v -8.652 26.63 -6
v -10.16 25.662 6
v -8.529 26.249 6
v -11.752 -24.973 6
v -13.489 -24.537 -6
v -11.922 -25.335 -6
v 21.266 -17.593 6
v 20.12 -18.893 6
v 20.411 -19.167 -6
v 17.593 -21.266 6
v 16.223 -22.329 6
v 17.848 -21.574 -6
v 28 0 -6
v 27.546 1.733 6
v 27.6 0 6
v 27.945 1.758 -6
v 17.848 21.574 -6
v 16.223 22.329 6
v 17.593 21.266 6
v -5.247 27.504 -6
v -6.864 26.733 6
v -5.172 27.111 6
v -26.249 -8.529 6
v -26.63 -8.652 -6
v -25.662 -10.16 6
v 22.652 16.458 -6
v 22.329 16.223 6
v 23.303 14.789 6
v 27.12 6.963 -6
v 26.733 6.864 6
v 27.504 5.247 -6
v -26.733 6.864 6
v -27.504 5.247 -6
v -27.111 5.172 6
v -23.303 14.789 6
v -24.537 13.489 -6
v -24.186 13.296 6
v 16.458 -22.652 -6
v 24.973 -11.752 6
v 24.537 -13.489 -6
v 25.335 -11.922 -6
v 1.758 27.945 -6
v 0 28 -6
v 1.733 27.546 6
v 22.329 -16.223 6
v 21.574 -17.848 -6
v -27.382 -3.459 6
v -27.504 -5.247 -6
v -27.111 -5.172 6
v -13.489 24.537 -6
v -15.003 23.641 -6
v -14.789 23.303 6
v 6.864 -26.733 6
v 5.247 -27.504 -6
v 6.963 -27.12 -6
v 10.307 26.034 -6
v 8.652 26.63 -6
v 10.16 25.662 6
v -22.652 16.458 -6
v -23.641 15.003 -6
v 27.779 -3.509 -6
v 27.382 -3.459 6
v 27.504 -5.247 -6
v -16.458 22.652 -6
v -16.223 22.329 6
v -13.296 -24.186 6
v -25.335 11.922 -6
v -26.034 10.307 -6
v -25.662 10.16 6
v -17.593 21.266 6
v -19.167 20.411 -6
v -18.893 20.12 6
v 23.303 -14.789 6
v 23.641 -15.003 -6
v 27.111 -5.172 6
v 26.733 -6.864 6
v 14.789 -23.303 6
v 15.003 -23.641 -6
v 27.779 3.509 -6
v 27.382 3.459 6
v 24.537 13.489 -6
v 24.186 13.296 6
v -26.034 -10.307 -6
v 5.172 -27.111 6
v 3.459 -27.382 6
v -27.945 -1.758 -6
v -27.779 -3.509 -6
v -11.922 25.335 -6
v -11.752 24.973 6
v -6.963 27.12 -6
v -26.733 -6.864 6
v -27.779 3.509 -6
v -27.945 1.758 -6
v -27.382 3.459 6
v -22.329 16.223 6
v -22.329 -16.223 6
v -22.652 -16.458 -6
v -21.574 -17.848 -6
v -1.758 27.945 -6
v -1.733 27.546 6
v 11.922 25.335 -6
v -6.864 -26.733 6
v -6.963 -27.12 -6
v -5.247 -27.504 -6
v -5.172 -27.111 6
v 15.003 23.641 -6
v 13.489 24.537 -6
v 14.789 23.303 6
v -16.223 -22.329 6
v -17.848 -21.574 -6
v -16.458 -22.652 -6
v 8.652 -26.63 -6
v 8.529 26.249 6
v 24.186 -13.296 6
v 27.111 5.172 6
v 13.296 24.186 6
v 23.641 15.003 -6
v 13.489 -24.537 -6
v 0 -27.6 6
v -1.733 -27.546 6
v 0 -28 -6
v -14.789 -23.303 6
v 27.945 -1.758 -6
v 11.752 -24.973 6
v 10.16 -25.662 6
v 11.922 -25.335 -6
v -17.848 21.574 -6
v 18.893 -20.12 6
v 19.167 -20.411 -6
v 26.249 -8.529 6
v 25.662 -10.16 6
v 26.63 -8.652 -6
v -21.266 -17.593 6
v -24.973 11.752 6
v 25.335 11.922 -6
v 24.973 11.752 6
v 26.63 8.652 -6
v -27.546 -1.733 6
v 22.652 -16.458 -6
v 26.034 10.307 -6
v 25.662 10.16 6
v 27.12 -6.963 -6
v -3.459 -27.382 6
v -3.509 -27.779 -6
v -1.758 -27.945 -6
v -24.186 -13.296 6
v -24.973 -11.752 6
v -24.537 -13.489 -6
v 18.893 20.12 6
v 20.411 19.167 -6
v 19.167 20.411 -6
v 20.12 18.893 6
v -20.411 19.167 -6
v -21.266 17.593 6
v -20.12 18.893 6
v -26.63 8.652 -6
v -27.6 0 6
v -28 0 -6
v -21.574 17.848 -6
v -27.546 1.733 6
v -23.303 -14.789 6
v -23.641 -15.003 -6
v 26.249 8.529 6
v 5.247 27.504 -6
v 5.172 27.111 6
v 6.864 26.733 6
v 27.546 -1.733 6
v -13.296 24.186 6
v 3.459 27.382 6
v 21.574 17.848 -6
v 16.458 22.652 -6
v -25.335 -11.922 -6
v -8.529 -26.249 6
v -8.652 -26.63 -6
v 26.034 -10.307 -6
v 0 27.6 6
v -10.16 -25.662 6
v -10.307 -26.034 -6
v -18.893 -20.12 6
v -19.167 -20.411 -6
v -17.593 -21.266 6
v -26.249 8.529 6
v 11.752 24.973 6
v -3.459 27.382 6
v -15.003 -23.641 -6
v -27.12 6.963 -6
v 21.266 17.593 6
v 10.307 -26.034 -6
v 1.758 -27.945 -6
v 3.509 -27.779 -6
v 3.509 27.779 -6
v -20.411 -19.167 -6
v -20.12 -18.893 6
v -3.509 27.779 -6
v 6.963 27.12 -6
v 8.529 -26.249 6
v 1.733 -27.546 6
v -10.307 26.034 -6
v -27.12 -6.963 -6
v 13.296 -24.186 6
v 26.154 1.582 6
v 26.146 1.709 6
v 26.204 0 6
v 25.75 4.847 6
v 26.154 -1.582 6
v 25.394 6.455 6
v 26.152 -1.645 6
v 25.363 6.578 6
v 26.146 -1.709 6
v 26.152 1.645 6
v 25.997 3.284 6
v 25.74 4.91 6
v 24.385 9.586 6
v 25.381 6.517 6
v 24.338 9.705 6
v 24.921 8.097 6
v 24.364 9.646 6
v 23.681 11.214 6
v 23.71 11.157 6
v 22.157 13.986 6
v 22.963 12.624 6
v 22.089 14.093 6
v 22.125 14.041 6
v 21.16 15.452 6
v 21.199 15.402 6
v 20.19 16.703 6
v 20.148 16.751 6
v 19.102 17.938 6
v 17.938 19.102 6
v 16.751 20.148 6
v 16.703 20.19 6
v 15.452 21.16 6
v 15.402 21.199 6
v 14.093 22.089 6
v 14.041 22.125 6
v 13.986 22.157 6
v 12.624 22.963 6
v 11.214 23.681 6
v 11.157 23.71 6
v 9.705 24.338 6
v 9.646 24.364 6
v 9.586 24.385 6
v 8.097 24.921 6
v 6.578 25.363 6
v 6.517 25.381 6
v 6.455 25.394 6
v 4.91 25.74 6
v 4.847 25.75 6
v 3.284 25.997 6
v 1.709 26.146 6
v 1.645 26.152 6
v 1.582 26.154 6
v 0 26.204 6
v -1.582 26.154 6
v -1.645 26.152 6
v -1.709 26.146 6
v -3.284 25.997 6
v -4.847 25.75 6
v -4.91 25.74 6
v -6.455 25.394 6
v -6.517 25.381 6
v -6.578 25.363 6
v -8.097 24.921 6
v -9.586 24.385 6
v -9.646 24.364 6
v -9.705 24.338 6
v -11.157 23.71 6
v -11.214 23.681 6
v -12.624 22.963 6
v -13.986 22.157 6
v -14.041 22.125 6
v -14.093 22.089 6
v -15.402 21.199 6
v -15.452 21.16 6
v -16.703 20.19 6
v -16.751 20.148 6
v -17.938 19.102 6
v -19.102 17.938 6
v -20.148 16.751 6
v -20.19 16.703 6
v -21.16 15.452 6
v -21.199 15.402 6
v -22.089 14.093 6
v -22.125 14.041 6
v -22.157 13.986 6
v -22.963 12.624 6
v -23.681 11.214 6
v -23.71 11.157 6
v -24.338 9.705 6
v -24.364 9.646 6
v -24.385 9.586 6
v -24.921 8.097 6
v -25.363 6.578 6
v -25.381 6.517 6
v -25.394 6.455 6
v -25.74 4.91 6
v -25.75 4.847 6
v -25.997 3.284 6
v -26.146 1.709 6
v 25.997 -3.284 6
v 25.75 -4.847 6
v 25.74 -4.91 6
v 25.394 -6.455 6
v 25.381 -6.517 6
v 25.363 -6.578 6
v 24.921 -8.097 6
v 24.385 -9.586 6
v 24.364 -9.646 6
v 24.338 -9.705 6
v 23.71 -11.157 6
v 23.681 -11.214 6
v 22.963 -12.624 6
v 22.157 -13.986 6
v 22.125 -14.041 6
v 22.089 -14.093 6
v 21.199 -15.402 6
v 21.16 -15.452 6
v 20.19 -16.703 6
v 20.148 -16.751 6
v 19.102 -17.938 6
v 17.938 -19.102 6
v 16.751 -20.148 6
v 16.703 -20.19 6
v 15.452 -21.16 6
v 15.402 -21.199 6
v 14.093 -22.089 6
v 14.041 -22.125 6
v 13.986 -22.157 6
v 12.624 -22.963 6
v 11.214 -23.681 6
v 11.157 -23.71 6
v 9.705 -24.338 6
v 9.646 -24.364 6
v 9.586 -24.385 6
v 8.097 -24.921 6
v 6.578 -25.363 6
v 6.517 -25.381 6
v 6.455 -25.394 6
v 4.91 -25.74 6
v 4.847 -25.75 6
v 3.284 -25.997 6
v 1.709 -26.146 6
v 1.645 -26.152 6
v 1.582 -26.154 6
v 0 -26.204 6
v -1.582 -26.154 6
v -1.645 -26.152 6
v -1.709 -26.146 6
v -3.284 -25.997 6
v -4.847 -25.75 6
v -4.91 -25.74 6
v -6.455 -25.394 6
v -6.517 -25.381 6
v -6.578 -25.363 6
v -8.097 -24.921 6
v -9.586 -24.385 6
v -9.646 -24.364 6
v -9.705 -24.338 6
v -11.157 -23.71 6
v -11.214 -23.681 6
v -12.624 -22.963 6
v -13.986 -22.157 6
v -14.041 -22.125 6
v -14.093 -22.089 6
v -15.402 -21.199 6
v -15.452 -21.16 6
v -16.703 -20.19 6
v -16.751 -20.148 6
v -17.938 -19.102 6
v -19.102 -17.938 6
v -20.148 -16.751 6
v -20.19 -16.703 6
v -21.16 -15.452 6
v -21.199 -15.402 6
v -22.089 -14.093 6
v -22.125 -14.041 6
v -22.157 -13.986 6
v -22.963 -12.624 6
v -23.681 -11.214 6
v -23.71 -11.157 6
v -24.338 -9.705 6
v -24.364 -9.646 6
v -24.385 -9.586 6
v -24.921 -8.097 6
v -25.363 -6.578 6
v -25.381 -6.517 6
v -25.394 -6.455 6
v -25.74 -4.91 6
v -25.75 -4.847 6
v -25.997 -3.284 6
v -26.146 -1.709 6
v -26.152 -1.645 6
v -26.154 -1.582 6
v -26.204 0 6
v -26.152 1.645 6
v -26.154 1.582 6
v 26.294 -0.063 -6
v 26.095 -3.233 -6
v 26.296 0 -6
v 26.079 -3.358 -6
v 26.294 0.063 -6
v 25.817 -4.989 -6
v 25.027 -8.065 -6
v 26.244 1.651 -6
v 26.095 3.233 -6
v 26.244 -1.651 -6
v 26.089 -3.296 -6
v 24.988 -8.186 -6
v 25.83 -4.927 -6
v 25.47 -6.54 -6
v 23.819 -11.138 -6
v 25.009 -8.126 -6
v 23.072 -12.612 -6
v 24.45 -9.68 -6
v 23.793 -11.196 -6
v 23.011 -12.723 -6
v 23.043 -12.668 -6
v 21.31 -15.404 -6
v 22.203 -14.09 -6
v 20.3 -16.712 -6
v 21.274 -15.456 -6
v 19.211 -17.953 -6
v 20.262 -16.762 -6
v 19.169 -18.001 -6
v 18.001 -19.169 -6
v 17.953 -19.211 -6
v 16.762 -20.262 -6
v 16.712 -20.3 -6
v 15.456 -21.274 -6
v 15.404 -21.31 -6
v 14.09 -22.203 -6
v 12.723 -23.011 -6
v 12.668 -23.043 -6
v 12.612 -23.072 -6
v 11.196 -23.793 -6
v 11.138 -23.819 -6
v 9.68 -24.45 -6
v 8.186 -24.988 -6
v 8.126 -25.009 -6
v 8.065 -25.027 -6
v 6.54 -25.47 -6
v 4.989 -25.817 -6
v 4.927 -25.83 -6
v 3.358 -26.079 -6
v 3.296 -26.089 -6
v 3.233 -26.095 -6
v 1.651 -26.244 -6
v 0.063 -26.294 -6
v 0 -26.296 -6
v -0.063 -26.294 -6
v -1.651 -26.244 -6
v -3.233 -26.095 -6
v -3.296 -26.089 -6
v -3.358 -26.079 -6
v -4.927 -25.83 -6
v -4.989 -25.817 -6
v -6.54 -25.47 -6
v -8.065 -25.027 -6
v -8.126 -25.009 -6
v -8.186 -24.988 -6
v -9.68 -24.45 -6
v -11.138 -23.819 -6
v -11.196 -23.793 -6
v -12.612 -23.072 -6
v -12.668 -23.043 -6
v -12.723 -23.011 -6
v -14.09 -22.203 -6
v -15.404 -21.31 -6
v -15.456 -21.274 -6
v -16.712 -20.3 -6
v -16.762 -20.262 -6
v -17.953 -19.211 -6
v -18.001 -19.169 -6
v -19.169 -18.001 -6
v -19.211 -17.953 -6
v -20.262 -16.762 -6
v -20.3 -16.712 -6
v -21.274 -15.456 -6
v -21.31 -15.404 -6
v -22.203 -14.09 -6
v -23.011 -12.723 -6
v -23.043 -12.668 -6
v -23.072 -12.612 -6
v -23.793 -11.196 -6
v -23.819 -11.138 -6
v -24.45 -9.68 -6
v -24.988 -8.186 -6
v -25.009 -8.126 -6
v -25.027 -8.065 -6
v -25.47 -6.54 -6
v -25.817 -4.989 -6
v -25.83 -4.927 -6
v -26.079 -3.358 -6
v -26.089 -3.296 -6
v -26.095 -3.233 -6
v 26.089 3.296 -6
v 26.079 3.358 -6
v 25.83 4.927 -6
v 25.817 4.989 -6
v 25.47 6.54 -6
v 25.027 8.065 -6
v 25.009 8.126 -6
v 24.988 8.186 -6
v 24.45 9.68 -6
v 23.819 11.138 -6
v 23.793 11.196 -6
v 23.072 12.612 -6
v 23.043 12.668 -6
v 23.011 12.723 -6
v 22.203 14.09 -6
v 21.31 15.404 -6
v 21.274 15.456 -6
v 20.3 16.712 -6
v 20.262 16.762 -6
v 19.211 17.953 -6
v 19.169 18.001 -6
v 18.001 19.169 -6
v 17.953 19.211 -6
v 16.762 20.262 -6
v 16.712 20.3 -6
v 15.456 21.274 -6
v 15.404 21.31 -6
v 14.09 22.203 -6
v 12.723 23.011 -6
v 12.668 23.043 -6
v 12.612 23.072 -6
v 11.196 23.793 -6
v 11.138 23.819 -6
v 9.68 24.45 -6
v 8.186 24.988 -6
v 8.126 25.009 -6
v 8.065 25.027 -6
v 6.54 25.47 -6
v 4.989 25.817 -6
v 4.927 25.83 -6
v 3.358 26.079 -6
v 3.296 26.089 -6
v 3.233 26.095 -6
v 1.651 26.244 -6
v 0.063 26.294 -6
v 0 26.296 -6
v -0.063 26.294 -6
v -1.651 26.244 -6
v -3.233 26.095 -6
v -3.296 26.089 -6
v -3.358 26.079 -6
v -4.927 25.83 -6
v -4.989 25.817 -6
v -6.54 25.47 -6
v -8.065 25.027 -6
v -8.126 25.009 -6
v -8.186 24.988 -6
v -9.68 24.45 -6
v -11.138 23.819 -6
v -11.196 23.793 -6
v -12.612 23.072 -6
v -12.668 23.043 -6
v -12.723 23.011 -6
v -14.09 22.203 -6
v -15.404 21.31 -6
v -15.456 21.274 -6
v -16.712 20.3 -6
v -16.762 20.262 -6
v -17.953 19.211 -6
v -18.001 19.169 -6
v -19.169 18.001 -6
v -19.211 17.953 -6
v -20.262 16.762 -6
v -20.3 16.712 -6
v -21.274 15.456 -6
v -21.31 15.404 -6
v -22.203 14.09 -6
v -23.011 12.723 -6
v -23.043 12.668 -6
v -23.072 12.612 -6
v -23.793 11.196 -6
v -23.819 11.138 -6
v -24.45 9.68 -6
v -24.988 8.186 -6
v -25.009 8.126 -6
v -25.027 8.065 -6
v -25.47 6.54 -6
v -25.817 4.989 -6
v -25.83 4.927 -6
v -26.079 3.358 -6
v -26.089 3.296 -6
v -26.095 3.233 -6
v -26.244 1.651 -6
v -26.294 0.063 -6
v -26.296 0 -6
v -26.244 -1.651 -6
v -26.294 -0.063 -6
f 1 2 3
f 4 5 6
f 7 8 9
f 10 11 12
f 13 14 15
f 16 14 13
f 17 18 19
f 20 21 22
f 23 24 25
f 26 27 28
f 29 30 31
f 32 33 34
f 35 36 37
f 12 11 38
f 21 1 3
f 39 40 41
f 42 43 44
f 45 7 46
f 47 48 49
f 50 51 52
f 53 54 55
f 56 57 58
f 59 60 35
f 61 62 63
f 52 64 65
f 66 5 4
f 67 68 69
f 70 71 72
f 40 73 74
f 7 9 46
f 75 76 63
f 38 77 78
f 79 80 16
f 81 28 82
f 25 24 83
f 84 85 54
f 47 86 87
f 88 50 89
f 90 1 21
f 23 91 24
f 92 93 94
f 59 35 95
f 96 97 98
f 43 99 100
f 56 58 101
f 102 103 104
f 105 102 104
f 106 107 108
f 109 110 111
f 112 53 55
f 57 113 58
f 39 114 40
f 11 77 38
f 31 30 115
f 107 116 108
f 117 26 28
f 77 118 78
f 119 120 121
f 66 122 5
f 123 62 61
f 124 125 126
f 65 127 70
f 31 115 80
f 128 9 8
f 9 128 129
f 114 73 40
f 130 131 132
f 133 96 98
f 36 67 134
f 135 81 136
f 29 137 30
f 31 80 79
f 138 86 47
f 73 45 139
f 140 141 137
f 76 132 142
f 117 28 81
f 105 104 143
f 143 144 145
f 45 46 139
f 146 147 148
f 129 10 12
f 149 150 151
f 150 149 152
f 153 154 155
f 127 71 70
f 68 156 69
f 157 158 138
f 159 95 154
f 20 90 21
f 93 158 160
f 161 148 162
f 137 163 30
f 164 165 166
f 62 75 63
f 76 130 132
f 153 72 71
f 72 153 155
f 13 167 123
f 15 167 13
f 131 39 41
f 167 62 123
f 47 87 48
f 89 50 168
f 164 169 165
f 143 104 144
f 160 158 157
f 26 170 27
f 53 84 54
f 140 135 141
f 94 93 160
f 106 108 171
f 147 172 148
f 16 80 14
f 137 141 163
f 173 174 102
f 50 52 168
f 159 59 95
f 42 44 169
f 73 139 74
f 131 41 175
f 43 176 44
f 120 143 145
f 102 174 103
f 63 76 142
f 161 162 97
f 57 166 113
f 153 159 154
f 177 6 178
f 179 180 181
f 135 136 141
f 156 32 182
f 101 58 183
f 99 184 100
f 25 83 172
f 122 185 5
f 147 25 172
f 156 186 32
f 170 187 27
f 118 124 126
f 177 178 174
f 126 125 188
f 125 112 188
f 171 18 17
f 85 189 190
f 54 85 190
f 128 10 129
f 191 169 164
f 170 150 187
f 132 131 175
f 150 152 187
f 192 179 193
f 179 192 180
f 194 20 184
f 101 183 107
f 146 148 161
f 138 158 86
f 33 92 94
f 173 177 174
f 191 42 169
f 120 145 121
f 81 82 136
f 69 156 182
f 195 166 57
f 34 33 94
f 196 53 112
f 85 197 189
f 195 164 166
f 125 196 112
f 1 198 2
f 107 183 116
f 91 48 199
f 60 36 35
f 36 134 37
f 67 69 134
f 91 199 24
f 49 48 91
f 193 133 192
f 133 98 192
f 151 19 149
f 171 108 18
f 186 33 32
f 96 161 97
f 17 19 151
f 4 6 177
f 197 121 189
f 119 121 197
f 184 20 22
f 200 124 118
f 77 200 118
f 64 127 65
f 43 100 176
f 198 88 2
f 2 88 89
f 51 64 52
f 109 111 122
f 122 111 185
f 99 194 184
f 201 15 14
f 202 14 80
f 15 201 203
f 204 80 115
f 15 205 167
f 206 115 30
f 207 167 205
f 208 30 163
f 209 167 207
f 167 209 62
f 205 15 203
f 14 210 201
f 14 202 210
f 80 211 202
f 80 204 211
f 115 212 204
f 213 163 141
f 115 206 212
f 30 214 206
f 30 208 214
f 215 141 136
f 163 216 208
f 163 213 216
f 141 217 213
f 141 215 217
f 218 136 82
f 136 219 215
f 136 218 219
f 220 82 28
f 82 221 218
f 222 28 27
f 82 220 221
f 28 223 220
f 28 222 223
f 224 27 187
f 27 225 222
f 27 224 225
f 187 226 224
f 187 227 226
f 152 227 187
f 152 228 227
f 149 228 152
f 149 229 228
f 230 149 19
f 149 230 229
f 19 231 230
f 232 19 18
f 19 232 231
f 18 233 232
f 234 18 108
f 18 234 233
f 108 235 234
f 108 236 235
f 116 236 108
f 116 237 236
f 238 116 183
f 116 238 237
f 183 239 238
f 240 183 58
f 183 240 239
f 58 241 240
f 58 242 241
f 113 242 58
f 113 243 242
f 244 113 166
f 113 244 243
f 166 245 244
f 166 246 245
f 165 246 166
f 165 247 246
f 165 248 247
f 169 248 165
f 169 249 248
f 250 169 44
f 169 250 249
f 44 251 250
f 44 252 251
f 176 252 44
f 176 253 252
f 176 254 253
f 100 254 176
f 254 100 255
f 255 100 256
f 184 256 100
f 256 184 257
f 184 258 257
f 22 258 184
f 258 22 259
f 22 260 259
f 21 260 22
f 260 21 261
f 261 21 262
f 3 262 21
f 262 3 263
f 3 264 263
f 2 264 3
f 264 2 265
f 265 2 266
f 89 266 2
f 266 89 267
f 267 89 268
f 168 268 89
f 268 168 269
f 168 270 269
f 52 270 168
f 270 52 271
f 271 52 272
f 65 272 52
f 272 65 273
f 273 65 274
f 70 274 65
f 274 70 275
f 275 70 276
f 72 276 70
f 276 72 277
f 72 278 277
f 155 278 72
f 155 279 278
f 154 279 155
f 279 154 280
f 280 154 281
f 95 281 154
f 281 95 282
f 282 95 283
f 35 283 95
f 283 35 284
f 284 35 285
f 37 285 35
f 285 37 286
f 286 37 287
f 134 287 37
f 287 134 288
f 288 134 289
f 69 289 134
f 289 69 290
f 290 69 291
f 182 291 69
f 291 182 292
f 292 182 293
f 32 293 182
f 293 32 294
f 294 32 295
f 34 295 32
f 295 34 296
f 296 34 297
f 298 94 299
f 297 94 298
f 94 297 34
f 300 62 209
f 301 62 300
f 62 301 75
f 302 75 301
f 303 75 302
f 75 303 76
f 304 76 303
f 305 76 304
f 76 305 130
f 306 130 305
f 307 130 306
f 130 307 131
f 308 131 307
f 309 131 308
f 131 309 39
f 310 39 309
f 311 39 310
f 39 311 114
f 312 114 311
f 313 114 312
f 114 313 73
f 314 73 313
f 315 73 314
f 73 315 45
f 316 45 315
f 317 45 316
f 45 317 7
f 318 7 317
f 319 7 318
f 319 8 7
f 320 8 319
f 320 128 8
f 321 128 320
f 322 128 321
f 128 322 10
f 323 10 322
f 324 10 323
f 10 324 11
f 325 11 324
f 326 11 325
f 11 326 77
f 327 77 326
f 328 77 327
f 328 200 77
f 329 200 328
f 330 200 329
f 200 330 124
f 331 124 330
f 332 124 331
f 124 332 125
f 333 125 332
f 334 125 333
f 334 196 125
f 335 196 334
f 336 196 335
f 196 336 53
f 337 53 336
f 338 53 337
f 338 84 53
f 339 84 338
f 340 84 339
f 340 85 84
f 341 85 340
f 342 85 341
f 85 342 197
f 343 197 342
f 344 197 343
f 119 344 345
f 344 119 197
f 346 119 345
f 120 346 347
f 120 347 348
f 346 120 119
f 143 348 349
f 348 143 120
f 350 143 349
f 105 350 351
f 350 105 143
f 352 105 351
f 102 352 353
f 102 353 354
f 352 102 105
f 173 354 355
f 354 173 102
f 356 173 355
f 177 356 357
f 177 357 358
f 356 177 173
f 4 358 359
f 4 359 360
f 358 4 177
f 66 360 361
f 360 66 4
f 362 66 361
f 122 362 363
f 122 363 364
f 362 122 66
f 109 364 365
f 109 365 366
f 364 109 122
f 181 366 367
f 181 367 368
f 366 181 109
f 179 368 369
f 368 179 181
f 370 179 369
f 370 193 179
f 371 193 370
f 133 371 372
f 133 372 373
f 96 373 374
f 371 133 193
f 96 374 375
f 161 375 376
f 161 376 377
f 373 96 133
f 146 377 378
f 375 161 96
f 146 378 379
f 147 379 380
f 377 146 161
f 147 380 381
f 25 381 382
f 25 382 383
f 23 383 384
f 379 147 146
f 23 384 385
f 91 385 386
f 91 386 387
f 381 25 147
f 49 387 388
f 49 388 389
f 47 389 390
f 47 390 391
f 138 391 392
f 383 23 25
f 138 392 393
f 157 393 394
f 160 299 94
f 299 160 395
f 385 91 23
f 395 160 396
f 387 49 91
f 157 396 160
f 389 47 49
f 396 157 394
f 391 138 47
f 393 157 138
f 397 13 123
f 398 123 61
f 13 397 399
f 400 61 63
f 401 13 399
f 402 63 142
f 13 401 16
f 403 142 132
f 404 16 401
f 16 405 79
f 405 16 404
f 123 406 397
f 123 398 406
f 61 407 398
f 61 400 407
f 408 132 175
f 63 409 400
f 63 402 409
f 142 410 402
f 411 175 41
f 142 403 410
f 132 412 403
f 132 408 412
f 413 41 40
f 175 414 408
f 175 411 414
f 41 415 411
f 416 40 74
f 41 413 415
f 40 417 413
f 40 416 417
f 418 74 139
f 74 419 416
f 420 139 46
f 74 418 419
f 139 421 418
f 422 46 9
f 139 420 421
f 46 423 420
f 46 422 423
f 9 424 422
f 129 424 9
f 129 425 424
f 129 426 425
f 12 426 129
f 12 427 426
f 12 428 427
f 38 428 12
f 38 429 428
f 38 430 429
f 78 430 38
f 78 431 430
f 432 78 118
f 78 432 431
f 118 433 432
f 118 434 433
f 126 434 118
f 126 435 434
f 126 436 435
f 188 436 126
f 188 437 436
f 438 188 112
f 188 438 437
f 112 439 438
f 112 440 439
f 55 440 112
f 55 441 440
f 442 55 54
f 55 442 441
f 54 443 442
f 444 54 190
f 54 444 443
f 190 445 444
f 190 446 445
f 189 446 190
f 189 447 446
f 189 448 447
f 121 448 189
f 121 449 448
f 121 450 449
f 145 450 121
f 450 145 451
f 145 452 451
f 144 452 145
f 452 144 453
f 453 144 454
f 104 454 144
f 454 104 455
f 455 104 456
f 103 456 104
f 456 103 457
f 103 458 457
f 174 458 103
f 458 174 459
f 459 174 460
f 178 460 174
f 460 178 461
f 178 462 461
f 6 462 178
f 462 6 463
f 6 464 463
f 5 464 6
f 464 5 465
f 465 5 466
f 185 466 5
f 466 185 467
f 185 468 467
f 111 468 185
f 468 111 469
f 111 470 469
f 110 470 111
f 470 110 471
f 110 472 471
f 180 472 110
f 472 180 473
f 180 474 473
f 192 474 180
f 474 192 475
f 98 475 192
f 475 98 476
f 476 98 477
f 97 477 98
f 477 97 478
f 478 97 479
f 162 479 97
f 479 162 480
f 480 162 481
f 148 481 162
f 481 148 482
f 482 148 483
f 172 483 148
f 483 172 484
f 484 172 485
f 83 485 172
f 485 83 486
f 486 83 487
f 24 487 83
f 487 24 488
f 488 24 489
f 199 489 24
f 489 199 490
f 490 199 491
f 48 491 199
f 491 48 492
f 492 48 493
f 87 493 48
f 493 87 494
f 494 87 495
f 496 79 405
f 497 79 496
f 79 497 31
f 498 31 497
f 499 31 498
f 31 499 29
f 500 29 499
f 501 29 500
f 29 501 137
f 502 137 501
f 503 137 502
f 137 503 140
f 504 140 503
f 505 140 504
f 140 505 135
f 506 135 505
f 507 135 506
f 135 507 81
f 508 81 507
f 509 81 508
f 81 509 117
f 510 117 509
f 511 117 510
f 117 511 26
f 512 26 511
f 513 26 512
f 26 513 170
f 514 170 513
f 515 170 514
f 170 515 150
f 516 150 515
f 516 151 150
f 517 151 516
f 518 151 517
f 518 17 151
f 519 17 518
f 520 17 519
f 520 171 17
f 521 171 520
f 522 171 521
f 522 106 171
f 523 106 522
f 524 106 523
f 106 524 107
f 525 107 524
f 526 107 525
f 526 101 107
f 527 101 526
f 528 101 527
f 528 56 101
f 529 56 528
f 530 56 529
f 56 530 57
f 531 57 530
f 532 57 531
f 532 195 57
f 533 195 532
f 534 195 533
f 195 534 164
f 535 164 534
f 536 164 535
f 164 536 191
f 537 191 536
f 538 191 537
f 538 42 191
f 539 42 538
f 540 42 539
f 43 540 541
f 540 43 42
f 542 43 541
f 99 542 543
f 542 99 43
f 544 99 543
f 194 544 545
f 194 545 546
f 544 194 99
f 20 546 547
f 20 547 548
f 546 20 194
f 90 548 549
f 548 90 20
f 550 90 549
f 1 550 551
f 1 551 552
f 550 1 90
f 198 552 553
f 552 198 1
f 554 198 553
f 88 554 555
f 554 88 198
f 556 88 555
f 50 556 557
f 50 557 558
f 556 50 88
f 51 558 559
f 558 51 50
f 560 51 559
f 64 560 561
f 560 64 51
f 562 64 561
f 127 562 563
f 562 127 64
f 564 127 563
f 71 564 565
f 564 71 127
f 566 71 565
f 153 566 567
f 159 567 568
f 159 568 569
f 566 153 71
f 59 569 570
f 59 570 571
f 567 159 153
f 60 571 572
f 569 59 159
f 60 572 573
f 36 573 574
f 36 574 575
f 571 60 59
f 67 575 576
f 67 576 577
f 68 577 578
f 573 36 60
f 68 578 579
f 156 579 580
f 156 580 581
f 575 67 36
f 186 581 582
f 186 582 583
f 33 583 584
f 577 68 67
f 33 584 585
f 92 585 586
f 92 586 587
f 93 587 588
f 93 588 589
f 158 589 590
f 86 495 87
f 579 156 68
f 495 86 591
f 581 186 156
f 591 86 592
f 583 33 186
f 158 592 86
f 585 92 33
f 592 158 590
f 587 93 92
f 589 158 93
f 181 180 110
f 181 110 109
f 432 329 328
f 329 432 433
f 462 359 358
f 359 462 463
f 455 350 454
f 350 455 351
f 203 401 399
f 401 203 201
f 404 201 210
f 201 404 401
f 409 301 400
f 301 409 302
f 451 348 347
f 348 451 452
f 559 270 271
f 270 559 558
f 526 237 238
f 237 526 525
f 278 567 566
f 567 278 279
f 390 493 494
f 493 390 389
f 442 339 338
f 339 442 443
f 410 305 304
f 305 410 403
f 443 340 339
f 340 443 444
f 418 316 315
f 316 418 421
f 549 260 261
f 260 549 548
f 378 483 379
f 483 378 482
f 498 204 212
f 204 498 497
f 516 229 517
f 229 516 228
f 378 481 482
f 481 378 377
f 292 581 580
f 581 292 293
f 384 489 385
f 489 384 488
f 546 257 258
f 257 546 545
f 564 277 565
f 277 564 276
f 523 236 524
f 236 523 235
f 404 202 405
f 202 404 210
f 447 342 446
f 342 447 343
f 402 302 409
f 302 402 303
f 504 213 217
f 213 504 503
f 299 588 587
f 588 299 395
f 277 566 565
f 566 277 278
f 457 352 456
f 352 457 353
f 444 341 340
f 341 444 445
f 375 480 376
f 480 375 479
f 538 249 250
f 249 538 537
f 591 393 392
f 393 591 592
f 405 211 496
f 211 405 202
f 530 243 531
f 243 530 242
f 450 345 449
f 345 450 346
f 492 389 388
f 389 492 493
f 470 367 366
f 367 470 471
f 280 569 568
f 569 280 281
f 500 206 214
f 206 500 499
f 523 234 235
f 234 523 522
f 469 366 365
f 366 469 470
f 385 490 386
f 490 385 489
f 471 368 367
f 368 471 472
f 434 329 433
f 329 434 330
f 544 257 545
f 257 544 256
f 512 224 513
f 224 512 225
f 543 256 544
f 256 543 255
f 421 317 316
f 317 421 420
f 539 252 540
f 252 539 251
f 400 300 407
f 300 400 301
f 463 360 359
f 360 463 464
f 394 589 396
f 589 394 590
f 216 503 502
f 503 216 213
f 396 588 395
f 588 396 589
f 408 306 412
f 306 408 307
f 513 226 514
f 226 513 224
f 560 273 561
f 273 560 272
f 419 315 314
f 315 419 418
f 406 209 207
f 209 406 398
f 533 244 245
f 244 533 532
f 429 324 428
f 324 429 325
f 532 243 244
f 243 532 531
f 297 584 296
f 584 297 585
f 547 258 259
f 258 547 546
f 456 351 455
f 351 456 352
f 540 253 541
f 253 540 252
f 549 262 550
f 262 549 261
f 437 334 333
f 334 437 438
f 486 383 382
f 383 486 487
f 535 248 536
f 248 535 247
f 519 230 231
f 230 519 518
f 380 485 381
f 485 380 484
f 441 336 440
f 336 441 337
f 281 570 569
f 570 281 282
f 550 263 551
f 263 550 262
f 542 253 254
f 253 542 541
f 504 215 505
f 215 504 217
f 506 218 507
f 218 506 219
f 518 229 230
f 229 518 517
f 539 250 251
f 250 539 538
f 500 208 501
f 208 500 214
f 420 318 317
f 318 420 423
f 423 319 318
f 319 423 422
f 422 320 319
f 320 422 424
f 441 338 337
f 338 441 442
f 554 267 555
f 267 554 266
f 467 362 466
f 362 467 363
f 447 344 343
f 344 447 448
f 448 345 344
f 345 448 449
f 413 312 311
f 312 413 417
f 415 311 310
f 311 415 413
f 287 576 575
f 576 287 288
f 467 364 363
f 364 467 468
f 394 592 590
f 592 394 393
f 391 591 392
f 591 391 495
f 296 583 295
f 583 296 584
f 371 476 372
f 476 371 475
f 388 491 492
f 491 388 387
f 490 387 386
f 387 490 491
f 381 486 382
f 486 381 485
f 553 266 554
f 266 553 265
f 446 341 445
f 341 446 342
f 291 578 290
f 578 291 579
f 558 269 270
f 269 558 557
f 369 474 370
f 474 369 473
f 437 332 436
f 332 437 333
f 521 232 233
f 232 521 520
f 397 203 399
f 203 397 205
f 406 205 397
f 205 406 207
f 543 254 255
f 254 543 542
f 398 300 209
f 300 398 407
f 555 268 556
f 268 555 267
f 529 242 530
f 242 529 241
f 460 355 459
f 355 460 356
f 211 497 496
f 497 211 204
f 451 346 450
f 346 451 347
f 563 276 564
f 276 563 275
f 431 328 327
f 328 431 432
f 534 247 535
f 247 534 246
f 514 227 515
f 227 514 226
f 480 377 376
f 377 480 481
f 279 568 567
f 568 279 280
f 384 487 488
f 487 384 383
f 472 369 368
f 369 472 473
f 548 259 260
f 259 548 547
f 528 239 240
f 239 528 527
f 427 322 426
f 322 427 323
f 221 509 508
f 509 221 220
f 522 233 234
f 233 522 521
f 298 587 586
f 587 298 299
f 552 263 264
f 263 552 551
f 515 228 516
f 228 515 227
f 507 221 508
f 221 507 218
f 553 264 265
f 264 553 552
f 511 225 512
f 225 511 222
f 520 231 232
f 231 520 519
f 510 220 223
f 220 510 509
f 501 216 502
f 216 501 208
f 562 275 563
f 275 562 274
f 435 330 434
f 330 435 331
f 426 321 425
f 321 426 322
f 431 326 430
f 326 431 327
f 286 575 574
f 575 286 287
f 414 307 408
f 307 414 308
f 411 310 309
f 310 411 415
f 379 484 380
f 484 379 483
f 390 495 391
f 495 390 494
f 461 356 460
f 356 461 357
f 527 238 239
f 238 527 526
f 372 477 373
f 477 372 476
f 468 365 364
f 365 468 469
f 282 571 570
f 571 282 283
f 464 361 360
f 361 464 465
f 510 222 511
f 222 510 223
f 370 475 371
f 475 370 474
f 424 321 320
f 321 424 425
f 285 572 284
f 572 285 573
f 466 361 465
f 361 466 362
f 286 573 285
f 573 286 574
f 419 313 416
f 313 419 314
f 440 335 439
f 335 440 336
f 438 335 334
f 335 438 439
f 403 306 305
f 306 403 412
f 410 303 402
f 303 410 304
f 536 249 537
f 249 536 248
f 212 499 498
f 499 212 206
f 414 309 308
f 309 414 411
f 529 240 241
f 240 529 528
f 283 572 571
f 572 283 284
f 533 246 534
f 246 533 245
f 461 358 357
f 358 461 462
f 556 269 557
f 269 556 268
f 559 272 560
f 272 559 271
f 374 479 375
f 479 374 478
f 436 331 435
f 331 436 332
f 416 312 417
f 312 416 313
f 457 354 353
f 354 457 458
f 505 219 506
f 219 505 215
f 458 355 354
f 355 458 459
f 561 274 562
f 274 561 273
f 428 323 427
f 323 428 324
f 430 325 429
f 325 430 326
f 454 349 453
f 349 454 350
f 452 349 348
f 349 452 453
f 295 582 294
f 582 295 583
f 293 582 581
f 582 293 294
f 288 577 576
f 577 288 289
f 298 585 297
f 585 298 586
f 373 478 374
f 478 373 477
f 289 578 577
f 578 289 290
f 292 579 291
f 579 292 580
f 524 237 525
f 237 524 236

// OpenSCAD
// Adapter ring for spool holder bearing
//   https://www.thingiverse.com/thing:454808

DI=52.6;          // Inner diameter = bearing outer diam.
DI2 =DI - 0.2;  // cone for 'perfect fit' - set DI2 = DI for perfect ring
    // better measure your printed (!) bearing with a sliding caliper
DA=56.0;      // Outer Diam. - my spools are often more than 55mm
DA2=DA - 0.8;   // cone for perfect fit, see above
h= 12;
Res = 100;    // resolution (openScad default is quite coarse)

difference() {
  cylinder (h, DA/2, DA2/2, center=true, $fn=Res );
  cylinder (h+1, DI/2, DI2/2, center=true, $fn=Res );  
        // h+1 avoids approximation artefacts @cone
}
